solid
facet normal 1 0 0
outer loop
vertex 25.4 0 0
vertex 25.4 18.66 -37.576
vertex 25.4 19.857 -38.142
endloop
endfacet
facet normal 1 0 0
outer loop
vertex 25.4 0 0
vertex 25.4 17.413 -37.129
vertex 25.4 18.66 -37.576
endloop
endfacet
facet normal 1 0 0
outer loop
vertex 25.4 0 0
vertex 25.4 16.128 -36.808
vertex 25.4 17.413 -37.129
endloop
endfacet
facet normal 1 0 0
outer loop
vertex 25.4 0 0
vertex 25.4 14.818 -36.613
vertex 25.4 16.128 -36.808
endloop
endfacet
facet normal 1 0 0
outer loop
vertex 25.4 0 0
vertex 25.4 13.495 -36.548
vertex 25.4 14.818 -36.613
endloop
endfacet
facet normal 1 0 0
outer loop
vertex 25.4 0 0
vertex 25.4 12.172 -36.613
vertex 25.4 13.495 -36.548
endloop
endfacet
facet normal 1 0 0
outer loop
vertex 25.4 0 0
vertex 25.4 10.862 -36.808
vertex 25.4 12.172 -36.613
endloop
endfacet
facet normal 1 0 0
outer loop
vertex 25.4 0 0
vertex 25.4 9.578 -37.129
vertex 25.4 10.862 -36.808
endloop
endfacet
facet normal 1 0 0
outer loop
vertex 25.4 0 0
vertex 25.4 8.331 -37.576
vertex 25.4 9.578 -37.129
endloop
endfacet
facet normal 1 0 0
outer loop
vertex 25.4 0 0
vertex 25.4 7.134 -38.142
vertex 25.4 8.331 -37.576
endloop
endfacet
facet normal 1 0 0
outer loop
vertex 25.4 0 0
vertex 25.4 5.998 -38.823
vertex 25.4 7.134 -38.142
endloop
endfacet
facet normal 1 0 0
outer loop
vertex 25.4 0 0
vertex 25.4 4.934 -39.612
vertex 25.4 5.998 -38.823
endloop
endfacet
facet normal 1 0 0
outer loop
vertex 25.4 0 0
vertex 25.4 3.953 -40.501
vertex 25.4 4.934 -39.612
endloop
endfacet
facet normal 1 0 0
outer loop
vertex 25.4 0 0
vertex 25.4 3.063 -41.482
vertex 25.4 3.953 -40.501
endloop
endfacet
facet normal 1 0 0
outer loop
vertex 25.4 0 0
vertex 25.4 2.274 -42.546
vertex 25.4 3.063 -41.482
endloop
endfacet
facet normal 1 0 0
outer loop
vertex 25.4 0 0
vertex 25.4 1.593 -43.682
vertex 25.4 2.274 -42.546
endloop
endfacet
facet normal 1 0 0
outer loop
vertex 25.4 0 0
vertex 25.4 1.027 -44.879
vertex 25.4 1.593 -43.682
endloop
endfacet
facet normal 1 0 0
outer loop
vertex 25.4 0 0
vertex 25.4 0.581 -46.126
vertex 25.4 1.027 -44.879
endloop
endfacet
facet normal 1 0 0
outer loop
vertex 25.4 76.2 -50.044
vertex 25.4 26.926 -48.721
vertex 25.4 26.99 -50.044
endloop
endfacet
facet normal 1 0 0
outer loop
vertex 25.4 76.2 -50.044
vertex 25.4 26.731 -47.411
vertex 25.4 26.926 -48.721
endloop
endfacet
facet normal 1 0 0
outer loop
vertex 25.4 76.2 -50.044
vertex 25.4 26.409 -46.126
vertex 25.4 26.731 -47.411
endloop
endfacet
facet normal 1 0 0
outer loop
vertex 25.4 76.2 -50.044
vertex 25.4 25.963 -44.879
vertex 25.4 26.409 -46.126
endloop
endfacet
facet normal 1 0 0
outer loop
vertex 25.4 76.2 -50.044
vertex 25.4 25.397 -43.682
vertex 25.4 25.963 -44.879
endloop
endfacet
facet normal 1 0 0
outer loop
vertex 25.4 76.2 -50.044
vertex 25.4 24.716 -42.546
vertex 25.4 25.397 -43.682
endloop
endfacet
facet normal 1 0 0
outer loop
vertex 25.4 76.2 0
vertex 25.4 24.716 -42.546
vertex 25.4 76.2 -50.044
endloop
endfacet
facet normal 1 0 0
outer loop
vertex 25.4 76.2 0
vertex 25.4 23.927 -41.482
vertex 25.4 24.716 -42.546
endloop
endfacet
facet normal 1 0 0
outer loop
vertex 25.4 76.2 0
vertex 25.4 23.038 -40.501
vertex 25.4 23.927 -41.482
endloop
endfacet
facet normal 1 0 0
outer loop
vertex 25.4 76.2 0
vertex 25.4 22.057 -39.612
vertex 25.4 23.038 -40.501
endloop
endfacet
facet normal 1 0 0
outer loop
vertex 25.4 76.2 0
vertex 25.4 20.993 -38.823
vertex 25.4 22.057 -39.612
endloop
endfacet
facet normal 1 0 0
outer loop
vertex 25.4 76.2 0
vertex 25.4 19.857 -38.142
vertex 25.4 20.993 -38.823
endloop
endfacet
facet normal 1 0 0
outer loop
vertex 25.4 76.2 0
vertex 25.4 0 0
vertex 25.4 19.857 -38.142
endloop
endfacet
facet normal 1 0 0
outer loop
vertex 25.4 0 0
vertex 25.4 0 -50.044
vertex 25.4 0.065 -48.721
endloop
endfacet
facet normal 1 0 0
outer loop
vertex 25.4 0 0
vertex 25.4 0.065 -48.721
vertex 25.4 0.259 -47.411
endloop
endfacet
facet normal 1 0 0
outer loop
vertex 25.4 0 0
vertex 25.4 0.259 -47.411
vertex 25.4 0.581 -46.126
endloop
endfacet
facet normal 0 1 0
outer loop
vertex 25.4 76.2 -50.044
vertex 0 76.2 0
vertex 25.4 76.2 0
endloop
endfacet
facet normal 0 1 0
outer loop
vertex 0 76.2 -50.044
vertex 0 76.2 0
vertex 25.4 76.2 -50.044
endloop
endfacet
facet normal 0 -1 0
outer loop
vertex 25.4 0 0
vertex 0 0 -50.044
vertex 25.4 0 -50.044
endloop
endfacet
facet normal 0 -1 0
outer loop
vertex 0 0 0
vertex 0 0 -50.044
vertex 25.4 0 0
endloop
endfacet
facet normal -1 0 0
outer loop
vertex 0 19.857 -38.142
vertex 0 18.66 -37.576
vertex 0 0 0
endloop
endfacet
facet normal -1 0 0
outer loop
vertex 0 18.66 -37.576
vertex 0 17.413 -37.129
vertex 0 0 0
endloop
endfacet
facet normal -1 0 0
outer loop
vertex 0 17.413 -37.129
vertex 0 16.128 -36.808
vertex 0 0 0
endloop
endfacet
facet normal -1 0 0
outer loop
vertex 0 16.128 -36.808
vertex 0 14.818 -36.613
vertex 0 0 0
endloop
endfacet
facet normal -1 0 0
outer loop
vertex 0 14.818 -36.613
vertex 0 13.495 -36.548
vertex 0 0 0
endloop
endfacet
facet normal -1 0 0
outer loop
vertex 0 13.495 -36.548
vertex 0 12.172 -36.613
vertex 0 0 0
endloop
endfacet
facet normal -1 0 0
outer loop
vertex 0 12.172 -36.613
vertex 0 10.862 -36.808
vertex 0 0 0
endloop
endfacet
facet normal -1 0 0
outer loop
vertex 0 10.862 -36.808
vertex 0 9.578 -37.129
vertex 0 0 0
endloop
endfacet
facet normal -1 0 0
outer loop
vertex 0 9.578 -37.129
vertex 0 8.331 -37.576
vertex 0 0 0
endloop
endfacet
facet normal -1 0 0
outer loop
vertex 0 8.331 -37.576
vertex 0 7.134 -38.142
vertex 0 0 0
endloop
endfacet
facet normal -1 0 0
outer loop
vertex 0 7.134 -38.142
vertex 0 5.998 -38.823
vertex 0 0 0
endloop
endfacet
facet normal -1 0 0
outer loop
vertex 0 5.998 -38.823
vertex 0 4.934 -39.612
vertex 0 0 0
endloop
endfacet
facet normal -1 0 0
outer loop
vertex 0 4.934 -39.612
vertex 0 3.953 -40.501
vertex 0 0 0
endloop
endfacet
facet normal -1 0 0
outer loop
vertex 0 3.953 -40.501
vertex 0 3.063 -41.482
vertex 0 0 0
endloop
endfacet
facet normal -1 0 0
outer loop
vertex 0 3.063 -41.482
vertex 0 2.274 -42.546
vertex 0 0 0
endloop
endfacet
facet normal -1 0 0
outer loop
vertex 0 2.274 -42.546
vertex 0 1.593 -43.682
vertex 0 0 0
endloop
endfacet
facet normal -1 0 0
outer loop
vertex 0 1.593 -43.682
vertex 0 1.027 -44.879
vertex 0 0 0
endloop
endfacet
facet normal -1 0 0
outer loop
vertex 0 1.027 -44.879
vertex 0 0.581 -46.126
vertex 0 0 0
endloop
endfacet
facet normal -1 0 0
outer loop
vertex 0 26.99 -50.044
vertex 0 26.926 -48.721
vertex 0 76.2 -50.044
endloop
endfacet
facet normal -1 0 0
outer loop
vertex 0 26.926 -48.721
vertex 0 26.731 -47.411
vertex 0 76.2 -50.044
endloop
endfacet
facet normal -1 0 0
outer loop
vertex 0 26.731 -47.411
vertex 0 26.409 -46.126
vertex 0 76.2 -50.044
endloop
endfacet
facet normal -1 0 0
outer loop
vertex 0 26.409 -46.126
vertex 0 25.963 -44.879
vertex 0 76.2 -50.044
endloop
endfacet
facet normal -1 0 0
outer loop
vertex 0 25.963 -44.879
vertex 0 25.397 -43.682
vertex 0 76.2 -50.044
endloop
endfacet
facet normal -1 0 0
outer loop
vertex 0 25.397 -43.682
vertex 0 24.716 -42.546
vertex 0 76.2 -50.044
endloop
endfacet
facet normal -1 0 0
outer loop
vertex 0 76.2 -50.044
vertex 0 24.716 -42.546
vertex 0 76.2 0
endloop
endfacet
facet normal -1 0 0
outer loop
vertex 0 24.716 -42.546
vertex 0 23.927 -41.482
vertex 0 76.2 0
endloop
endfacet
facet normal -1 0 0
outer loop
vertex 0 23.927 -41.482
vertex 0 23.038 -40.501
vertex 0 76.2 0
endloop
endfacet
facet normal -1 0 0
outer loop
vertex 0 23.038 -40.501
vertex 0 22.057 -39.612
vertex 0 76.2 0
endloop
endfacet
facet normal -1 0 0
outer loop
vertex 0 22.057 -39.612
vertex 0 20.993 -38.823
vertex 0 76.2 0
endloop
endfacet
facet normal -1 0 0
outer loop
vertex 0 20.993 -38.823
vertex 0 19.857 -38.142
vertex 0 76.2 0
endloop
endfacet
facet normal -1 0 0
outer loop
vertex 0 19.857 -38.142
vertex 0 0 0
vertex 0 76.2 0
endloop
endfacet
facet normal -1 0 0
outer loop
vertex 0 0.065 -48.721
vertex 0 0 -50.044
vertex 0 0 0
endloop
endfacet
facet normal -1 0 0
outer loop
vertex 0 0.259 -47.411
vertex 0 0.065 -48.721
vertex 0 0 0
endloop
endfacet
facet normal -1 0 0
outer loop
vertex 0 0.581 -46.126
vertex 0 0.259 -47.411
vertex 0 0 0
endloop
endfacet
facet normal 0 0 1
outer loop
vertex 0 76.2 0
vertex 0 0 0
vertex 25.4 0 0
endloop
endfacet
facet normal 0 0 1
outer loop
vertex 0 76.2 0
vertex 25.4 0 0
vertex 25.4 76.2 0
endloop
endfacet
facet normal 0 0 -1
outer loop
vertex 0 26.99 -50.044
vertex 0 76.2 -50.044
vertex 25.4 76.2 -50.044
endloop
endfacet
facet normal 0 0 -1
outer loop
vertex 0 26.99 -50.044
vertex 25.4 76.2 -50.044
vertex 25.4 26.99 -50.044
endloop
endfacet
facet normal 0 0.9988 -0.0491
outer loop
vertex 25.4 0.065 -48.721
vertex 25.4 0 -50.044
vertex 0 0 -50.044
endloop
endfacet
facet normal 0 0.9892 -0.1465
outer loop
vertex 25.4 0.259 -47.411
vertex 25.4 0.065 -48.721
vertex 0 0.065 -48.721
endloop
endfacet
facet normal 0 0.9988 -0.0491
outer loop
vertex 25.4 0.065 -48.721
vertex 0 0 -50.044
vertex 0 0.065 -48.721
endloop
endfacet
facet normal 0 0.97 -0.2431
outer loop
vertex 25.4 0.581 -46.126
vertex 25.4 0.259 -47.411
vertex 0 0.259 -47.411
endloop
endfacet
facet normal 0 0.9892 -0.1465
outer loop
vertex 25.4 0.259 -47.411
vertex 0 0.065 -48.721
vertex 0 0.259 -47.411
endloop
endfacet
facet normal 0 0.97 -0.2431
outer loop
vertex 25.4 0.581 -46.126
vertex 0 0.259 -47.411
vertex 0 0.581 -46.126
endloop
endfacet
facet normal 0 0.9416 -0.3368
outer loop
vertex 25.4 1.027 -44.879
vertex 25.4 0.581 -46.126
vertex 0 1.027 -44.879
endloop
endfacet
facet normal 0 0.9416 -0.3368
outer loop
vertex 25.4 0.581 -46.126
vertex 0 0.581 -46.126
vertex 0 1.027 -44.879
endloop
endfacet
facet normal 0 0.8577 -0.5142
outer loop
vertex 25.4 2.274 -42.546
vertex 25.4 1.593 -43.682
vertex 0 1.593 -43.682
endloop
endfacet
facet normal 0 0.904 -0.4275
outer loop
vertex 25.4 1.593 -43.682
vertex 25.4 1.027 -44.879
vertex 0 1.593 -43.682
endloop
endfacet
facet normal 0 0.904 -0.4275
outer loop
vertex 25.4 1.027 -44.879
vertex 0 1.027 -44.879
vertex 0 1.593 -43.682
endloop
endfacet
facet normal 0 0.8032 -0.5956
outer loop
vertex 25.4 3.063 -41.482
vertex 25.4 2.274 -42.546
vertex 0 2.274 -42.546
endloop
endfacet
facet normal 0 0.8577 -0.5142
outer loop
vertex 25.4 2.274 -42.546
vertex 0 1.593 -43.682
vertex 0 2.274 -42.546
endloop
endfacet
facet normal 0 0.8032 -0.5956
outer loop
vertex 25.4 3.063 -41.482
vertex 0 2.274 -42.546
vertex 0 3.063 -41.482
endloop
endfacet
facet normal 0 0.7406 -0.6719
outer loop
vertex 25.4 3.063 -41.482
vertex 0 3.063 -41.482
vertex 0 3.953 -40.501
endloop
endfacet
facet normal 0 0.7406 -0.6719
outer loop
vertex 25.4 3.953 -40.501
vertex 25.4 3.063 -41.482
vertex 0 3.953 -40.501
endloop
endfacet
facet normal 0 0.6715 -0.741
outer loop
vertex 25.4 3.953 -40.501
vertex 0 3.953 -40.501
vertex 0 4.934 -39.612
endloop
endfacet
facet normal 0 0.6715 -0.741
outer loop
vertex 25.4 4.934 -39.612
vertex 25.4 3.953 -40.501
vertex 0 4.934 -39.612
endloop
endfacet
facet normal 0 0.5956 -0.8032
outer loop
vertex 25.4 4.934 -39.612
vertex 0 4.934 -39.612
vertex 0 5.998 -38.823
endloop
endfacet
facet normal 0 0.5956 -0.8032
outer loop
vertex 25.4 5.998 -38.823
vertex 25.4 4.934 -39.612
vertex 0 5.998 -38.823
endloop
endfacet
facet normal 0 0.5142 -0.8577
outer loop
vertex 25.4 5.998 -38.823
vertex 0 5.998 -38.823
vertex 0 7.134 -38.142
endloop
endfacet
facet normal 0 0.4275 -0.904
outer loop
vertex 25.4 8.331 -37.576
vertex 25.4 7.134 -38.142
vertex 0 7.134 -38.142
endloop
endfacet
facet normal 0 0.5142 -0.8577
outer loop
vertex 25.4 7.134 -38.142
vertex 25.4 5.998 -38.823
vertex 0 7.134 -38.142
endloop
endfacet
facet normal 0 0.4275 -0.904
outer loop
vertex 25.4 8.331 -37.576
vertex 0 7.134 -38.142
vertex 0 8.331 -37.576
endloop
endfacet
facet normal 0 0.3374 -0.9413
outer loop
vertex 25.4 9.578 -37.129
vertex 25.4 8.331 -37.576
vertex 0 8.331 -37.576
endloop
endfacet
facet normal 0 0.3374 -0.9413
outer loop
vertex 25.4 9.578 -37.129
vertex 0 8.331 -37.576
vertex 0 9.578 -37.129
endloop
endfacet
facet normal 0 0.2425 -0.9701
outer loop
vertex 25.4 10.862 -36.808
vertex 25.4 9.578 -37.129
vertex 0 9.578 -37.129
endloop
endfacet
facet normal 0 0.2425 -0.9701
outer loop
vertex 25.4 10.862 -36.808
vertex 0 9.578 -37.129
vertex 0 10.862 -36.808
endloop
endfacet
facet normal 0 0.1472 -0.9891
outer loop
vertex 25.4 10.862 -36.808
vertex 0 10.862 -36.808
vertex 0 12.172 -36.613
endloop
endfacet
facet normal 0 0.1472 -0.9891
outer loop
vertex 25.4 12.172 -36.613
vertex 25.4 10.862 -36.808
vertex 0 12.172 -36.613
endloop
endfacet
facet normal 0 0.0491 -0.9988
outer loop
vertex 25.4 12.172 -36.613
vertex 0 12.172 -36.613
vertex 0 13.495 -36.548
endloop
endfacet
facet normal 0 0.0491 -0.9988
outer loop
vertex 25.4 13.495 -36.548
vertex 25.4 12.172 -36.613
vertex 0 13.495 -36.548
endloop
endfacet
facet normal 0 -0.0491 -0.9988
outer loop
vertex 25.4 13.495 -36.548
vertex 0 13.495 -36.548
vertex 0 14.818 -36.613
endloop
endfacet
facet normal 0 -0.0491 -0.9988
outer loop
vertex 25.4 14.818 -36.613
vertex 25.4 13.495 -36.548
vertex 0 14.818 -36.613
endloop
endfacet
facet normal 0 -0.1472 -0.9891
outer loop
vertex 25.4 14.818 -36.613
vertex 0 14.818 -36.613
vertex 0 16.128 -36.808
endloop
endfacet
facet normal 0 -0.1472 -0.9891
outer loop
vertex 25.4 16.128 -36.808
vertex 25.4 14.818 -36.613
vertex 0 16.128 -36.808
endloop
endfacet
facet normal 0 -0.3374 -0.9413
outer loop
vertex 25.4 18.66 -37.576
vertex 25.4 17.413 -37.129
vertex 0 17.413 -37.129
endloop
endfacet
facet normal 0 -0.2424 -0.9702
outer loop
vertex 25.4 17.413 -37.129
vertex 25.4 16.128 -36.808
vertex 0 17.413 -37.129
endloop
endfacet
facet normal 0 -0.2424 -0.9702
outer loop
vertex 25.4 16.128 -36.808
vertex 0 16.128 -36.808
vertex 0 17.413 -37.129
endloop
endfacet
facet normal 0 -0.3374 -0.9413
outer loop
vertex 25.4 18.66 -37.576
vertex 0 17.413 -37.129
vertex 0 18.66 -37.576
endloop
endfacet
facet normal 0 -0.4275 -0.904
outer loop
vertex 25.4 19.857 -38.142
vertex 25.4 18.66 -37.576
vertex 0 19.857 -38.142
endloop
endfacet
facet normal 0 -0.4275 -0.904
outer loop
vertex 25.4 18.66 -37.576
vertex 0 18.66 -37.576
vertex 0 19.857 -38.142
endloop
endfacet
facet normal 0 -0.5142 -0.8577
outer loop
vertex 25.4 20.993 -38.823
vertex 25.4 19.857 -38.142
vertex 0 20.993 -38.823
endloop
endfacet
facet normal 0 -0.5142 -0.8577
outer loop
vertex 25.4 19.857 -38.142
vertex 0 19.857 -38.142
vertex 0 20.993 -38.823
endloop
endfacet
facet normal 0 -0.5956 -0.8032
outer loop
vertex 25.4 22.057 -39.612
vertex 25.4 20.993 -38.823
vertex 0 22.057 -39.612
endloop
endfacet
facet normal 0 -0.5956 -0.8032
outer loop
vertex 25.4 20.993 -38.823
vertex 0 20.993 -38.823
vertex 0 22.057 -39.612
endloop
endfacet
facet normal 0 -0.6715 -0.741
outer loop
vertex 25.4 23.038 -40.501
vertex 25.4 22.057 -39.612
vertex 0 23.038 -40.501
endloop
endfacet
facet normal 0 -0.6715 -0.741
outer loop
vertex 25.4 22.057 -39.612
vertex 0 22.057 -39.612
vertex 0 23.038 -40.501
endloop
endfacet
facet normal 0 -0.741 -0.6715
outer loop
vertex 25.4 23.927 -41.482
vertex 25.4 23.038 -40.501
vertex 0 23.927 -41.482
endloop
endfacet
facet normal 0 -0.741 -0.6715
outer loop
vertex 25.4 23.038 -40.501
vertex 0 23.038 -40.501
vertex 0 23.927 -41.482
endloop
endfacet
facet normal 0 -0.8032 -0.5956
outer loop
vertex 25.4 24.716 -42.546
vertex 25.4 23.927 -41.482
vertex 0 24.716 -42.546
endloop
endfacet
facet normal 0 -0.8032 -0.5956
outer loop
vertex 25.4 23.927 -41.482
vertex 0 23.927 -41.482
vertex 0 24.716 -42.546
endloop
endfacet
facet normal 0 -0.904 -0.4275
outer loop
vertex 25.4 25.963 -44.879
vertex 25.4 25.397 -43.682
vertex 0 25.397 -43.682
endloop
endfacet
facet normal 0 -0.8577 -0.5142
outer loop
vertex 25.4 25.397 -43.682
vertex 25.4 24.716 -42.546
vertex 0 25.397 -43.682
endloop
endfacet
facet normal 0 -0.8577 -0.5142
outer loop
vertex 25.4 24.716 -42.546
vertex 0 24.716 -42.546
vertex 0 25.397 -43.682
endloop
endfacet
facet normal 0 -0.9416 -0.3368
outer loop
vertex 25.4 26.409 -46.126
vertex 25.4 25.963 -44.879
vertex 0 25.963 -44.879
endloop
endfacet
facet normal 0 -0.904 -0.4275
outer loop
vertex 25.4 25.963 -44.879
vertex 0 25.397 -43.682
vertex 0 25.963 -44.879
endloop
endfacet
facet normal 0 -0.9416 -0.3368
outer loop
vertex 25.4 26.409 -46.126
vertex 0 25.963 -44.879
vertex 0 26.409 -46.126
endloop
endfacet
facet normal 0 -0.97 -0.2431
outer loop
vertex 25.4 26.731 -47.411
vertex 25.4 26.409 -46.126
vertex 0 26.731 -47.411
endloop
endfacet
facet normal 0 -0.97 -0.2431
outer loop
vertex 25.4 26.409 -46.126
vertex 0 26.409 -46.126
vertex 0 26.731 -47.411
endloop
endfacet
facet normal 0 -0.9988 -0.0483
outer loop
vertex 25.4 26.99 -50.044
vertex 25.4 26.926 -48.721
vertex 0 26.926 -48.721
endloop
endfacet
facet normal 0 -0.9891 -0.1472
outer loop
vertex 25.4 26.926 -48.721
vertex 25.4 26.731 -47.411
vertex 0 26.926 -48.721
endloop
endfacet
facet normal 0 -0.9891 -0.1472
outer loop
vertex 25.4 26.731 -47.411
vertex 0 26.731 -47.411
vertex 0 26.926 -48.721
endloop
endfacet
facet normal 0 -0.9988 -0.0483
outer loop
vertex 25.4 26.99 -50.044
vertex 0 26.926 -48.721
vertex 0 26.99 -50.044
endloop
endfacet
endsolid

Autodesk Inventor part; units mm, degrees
ref_plane "YZ Plane" through (0, 0, 0) normal (1, 0, 0) x (0, 1, 0)
ref_plane "XZ Plane" through (0, 0, 0) normal (0, 1, 0) x (-1, 0, 0)
ref_plane "XY Plane" through (0, 0, 0) normal (0, 0, 1) x (1, 0, 0)
sketch "Sketch1" plane through (0, 0, 0) normal (1, 0, 0) x (0, 1, 0)
  line L0 (0, 0) -> (76.2, 0)
  line L1 (76.2, 0) -> (76.2, -50.0436)
  line L2 (76.2, -50.0436) -> (0, -50.0436)
  line L3 (0, -50.0436) -> (0, 0)
  arc A0 (26.9905, -50.0436) -> (0, -50.0436) centre (13.4952, -50.0436) ccw
  dimension "d0" = 76.2
extrude "Extrusion1" add sketch "Sketch1" along normal blind 25.4 contours L0 L1 L2 A0 L3
properties part number "holding unit"
